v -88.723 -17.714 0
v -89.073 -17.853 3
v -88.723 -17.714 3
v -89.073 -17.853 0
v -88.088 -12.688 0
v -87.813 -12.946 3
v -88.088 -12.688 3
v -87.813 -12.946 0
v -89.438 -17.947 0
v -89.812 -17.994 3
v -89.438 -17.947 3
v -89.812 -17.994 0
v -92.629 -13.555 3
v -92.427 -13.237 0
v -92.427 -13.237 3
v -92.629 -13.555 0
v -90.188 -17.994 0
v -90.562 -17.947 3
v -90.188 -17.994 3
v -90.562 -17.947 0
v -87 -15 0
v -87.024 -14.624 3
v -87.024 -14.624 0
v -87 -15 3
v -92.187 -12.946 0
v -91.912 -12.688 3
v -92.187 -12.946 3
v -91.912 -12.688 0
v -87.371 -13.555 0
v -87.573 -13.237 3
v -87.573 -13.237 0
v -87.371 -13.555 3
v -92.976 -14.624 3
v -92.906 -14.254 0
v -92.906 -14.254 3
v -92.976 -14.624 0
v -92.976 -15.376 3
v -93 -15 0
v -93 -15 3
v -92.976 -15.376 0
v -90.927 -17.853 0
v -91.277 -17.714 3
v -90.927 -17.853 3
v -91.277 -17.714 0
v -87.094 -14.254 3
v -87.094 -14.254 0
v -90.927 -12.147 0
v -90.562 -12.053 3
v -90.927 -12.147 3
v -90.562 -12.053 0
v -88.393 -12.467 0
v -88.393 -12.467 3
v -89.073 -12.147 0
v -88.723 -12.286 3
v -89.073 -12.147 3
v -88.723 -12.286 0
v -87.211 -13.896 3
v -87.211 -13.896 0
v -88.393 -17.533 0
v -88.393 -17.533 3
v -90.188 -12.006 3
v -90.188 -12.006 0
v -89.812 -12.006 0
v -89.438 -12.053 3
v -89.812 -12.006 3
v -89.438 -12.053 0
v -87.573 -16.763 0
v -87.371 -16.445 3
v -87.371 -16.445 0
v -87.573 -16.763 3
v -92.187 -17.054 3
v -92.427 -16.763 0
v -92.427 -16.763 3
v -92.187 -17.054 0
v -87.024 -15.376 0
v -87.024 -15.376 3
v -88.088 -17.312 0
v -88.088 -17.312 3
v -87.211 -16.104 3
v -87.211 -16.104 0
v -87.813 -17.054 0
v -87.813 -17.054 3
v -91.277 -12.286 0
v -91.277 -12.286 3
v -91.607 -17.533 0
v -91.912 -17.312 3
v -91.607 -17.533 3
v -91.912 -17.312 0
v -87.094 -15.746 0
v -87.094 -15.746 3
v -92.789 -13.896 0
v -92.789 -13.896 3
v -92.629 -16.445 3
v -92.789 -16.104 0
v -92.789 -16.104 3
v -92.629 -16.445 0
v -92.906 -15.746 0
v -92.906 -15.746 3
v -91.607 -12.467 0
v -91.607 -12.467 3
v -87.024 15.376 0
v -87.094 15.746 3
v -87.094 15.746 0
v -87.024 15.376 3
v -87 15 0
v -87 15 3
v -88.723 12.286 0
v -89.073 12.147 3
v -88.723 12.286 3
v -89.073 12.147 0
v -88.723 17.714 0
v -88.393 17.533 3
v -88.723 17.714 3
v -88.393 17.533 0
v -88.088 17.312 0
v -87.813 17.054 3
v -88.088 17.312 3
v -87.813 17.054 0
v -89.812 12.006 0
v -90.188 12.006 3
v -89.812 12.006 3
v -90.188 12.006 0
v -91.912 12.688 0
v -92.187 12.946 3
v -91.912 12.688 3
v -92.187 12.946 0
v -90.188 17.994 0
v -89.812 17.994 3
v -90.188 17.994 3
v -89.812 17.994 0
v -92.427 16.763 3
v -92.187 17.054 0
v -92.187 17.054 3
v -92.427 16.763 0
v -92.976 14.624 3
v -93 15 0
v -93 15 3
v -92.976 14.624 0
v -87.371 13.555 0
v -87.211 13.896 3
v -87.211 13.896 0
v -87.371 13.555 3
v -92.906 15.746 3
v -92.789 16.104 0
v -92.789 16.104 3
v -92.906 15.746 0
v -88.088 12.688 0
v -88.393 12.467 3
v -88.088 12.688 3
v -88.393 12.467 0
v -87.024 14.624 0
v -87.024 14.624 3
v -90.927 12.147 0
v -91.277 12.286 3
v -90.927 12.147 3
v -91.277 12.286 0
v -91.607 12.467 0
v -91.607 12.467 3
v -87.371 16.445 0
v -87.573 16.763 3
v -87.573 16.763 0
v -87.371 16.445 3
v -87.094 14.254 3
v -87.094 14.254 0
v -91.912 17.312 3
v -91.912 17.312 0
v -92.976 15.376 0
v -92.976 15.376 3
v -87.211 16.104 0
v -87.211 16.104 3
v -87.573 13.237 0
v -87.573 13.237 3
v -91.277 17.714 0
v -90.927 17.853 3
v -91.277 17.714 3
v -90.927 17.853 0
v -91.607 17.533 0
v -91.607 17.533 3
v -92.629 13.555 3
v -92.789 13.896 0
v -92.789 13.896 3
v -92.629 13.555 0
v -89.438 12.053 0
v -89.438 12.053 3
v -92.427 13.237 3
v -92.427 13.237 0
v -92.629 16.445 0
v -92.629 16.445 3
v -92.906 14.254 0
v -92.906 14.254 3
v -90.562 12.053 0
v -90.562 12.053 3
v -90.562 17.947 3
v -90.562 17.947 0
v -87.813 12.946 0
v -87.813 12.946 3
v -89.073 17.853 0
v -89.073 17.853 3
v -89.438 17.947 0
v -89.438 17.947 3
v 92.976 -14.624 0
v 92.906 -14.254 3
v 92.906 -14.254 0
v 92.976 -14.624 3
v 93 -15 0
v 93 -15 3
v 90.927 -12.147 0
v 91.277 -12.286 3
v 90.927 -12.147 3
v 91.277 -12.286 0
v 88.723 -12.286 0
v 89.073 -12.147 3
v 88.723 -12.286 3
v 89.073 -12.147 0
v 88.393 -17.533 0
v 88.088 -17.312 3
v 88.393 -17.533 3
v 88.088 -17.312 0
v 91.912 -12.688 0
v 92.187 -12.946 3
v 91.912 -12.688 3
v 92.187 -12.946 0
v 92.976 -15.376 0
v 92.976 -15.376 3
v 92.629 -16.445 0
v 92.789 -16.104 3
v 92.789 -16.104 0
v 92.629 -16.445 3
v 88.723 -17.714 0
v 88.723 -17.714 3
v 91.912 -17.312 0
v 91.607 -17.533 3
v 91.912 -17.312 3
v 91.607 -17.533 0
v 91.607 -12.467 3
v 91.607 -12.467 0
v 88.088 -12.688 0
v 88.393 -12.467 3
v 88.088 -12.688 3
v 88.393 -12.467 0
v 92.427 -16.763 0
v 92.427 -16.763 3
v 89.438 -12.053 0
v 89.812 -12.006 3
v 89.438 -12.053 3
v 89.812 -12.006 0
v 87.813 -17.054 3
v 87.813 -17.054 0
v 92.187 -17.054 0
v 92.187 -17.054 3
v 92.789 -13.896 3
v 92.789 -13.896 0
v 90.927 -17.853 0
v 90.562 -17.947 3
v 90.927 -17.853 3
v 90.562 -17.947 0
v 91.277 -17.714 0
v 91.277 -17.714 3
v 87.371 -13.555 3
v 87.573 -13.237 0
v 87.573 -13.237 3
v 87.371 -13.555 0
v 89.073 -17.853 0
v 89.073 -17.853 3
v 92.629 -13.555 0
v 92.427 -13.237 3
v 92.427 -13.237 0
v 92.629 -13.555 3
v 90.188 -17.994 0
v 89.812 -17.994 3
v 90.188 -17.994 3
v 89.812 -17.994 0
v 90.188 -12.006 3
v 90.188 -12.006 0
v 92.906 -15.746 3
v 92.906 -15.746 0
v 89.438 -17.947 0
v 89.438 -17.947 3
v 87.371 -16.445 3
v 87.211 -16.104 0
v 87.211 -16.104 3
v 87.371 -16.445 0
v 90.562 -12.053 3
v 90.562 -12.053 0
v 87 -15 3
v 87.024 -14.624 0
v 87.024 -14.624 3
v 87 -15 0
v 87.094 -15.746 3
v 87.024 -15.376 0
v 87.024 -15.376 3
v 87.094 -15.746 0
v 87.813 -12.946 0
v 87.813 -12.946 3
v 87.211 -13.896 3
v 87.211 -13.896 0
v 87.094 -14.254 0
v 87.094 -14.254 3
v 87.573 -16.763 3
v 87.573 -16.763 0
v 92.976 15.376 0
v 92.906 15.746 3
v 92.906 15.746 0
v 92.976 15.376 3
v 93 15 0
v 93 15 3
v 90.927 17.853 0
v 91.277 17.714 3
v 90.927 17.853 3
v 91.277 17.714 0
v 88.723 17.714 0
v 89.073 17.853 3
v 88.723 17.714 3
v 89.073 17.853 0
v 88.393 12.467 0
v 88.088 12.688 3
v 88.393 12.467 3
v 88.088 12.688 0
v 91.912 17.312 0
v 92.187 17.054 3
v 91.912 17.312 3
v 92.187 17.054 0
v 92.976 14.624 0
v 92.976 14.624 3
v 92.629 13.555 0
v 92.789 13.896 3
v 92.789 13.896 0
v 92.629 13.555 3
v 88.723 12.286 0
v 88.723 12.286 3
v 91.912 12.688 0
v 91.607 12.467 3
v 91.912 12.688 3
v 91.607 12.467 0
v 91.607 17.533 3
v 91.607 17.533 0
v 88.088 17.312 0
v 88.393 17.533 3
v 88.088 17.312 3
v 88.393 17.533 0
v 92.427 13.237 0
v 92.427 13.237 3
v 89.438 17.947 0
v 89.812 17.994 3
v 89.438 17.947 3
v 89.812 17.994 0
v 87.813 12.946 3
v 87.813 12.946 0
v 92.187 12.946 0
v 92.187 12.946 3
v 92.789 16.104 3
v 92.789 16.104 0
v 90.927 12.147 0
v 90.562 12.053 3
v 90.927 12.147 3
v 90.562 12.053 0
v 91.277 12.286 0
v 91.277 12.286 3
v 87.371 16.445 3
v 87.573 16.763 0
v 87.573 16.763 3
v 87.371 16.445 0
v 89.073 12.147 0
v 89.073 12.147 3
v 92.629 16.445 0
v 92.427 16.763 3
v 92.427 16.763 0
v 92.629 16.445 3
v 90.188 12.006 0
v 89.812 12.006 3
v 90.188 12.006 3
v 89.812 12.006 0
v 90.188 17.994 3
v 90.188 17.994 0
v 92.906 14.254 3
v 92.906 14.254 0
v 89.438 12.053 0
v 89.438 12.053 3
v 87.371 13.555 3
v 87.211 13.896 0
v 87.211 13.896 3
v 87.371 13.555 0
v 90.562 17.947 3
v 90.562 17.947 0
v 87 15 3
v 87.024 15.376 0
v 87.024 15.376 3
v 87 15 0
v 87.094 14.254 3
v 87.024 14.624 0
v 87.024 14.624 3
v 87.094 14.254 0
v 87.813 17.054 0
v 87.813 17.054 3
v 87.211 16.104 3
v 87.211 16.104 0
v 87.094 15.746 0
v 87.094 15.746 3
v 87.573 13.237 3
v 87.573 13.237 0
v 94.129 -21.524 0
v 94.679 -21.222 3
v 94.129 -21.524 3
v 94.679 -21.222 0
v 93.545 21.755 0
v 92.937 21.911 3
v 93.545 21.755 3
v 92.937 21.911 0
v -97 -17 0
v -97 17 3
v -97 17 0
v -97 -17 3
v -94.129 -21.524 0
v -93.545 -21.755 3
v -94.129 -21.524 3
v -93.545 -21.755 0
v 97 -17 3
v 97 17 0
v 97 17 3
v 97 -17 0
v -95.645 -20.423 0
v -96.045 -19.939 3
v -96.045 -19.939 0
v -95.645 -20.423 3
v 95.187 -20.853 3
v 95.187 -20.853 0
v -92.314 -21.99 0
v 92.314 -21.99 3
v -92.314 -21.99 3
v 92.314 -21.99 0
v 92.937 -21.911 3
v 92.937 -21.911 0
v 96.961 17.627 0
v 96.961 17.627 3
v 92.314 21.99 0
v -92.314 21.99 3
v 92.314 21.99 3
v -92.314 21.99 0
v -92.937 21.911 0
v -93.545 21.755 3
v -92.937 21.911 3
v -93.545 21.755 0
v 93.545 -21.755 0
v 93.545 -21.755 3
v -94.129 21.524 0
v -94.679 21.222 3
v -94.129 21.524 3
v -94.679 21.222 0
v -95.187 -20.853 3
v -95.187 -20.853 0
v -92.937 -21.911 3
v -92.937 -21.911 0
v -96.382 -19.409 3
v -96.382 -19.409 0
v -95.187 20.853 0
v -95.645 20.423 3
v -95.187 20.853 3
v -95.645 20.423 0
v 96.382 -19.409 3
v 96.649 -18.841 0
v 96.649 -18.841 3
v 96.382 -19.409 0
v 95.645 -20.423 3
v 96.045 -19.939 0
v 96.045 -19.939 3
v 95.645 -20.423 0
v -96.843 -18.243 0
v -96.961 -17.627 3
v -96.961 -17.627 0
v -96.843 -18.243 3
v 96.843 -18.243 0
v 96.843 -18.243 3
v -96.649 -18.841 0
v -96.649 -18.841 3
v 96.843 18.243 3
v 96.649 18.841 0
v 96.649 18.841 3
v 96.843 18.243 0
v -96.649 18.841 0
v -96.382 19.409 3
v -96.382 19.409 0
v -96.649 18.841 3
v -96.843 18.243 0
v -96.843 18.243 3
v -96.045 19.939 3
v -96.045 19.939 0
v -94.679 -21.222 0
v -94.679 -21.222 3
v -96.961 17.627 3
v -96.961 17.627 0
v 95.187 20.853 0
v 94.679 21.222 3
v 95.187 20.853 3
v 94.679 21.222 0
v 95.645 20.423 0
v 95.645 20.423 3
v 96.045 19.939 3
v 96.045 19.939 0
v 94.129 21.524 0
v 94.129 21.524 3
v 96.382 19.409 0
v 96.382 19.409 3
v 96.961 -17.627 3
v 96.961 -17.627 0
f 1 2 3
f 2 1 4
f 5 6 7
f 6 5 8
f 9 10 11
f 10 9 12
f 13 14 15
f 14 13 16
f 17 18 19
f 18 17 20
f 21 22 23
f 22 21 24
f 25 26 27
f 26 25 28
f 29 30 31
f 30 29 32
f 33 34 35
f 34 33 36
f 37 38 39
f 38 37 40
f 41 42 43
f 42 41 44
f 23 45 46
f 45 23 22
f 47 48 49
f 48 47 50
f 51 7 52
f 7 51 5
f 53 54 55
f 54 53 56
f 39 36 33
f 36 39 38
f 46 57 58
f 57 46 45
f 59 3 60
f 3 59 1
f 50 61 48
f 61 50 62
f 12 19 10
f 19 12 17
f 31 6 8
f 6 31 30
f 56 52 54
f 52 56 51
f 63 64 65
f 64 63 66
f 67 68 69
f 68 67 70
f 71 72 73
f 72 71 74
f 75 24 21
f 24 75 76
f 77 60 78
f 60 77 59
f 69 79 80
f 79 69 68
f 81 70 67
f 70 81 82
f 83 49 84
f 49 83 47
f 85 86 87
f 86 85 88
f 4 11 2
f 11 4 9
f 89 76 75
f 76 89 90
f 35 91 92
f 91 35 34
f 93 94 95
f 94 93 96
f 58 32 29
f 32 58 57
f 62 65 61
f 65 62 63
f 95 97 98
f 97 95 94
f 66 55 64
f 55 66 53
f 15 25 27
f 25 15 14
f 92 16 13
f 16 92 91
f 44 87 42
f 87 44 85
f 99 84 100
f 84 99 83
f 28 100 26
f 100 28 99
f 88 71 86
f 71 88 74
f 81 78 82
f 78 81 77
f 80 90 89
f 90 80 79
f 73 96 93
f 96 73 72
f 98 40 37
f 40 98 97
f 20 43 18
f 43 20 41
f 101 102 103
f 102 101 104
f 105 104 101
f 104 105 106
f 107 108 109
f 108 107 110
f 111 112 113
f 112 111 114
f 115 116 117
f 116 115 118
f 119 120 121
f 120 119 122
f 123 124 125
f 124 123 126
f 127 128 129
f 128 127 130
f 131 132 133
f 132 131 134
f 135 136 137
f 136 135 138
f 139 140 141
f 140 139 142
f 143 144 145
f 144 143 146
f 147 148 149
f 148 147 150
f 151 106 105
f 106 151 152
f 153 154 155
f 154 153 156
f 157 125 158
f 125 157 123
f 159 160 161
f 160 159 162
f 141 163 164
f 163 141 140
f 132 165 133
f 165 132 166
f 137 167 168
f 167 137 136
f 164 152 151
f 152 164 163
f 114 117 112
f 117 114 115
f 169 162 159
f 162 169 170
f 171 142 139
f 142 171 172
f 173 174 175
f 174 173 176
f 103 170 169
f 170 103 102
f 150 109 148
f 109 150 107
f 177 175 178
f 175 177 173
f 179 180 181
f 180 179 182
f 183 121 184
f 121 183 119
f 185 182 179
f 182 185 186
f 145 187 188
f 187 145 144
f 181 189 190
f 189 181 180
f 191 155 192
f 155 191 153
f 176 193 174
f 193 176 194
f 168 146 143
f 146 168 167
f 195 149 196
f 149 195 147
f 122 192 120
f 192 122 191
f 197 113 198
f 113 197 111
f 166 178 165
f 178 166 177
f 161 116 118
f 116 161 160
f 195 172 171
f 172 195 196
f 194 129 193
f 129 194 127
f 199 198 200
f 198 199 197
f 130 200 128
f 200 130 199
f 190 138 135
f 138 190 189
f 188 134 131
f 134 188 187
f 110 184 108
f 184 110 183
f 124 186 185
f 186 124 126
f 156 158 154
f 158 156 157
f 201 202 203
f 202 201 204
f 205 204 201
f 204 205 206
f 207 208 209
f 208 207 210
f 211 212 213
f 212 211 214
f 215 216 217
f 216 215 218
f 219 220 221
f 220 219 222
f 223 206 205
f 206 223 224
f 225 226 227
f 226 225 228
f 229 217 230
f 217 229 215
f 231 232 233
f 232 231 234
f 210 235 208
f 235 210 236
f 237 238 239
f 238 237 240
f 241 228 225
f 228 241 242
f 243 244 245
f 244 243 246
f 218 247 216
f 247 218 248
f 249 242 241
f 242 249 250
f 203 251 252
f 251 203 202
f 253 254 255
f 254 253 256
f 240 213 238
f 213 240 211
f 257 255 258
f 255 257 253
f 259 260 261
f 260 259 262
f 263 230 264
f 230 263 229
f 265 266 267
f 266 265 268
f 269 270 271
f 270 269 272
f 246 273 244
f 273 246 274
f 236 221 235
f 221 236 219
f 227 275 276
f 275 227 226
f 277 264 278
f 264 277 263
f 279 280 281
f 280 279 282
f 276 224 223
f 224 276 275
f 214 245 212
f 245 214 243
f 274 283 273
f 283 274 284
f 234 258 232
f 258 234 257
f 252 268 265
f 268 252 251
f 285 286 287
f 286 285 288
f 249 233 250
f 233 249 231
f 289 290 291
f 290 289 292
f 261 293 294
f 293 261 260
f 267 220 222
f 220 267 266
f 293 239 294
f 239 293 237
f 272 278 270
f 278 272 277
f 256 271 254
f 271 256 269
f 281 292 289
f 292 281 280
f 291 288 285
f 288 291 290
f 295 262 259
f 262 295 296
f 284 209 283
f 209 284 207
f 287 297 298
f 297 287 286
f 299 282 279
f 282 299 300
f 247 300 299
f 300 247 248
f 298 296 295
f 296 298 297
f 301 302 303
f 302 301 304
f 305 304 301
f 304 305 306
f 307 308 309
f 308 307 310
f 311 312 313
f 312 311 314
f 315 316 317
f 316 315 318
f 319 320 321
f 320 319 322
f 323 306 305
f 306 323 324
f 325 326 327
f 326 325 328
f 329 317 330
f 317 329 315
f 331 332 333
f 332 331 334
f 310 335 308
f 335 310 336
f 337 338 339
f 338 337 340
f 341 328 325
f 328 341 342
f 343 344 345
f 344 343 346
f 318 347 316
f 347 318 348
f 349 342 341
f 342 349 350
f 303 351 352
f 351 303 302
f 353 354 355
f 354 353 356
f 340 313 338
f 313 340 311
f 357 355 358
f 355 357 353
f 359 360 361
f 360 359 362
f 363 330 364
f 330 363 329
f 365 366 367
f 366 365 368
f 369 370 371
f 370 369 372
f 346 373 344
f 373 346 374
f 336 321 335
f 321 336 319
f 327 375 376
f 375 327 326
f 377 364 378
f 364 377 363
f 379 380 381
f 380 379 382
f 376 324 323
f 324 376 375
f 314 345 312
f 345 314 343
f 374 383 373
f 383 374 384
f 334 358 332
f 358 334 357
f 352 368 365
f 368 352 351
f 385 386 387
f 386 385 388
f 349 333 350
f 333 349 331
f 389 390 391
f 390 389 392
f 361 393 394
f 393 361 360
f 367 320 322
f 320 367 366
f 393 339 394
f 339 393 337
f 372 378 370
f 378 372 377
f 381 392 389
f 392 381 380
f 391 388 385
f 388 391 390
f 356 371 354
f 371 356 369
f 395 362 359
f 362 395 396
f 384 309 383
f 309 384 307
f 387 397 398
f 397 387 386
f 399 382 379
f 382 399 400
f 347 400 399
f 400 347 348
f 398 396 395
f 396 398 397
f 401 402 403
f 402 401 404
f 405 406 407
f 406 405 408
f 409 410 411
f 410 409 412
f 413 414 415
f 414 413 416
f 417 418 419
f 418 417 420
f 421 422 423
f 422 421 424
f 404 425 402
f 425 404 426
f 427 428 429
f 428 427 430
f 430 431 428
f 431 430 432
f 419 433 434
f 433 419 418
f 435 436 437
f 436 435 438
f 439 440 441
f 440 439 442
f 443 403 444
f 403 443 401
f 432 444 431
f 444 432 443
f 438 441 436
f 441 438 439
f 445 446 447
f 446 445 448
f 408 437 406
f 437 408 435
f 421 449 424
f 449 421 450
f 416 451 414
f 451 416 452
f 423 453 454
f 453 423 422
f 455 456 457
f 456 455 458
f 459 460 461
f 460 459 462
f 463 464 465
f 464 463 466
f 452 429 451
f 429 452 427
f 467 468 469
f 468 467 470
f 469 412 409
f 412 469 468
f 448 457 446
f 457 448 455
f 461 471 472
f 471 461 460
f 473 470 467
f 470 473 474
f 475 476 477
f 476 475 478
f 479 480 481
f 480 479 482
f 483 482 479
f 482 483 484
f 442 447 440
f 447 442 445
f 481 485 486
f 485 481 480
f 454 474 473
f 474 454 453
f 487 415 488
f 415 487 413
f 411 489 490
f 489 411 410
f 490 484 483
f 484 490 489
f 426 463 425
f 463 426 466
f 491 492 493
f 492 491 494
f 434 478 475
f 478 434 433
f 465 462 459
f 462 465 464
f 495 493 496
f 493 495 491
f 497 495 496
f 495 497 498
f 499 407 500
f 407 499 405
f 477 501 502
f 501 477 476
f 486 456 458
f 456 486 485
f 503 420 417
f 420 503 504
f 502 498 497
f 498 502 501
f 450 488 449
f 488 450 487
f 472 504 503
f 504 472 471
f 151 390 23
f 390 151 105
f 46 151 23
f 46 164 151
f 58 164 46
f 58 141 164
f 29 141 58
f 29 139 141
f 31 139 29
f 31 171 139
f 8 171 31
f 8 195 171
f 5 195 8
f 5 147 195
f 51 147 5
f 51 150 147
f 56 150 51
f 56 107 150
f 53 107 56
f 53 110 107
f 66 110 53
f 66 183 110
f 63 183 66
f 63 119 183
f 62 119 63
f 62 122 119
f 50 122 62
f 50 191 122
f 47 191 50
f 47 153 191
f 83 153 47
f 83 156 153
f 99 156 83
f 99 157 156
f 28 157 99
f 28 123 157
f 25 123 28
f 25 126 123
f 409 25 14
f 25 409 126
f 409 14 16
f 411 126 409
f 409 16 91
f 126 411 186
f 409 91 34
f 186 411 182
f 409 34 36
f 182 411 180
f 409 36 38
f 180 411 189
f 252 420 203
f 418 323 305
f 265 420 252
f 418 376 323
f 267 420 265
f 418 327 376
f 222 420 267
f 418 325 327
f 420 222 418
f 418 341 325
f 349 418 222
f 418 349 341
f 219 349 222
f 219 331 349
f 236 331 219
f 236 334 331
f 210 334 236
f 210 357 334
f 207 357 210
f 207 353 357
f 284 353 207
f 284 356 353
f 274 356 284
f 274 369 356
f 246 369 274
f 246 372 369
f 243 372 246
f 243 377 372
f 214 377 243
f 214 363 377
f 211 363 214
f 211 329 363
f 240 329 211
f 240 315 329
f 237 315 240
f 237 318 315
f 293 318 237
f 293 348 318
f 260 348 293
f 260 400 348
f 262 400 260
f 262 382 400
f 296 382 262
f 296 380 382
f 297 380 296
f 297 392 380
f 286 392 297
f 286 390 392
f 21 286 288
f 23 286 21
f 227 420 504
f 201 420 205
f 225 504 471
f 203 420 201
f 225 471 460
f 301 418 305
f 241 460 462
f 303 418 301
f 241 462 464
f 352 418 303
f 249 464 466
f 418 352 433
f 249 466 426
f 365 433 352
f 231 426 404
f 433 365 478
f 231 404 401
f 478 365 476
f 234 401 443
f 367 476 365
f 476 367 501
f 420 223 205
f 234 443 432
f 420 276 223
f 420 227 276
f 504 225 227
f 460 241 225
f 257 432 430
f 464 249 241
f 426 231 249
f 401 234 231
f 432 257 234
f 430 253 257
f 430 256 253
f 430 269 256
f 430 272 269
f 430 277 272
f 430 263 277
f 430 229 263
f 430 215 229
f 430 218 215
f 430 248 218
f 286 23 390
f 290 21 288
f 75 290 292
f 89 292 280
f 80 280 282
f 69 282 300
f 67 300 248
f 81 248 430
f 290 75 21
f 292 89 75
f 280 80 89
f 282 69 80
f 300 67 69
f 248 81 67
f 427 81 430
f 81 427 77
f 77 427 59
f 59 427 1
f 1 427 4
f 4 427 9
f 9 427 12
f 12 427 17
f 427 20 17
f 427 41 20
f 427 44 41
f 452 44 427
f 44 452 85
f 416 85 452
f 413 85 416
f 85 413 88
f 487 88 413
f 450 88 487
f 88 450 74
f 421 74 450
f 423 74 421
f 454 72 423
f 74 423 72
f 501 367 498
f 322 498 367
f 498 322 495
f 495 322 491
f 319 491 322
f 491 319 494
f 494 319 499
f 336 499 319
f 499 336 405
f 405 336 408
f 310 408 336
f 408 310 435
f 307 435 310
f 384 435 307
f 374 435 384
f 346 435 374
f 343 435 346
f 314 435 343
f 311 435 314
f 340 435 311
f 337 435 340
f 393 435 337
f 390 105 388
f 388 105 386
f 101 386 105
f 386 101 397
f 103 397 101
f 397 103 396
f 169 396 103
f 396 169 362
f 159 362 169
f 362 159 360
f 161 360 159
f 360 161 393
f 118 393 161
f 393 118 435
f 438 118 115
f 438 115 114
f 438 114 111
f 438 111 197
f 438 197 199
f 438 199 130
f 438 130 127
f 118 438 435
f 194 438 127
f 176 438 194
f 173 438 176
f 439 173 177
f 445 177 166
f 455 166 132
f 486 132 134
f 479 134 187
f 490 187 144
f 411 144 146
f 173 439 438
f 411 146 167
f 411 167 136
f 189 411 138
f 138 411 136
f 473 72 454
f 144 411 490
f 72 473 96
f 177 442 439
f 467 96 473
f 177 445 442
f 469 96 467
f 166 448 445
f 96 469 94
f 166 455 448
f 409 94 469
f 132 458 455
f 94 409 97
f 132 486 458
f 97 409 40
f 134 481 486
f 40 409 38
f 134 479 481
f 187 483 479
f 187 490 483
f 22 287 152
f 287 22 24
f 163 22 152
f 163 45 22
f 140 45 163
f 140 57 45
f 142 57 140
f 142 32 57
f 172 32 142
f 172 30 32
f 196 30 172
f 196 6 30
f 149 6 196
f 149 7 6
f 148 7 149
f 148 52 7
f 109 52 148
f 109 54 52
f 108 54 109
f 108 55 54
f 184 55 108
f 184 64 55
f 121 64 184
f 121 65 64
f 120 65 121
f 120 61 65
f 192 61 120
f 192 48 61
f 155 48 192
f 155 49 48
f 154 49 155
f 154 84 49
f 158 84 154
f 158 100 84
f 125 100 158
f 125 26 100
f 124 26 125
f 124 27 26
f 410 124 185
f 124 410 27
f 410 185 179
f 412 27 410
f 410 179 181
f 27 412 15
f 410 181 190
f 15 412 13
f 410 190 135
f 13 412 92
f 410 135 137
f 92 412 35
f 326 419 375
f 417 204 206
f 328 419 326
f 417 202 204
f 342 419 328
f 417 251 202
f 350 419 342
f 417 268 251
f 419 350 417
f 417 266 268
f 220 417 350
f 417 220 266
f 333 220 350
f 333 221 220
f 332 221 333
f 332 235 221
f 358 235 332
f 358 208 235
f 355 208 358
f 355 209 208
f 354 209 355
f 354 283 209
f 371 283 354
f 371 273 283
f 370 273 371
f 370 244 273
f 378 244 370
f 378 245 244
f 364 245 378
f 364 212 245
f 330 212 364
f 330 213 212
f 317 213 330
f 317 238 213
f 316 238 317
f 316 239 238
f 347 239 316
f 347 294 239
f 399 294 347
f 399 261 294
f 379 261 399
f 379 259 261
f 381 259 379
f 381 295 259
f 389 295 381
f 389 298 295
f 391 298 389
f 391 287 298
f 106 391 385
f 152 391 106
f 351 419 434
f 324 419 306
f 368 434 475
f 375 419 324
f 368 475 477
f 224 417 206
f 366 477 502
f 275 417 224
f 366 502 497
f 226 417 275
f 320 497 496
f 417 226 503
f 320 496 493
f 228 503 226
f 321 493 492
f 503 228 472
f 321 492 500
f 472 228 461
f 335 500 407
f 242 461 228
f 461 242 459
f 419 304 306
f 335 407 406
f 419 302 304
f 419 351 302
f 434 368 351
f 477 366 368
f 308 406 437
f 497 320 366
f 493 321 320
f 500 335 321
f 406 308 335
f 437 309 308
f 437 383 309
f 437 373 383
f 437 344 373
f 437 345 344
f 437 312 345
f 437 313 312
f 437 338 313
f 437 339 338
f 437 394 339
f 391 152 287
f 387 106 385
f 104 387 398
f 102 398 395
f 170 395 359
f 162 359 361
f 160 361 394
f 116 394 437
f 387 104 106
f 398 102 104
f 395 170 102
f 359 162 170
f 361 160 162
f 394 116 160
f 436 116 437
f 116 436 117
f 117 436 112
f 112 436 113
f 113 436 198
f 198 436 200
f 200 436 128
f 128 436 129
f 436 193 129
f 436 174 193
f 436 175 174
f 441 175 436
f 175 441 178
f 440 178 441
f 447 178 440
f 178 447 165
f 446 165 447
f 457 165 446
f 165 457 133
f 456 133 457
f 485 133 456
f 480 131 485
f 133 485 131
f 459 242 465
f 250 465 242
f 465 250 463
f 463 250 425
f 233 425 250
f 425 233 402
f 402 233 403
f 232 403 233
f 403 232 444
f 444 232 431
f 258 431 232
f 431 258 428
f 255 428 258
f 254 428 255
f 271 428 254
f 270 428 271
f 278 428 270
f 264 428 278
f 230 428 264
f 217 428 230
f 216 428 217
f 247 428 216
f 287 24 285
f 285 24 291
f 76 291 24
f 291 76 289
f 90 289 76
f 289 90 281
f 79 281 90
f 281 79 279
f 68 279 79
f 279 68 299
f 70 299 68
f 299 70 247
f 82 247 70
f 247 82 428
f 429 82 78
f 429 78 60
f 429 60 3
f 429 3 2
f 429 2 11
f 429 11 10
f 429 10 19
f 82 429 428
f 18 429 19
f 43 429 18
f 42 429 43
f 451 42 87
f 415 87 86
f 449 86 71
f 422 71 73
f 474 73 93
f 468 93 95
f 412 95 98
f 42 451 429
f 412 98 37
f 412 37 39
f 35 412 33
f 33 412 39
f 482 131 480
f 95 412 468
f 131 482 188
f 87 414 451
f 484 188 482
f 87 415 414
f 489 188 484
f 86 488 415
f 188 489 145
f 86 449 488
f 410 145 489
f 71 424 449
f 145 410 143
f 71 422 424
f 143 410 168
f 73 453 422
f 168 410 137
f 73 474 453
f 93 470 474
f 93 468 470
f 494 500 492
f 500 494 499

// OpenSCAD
$fn = 50;


difference() {
	union() {
		hull() {
			translate(v = [-92.0000000000, 17.0000000000, 0]) {
				cylinder(h = 3, r = 5);
			}
			translate(v = [92.0000000000, 17.0000000000, 0]) {
				cylinder(h = 3, r = 5);
			}
			translate(v = [-92.0000000000, -17.0000000000, 0]) {
				cylinder(h = 3, r = 5);
			}
			translate(v = [92.0000000000, -17.0000000000, 0]) {
				cylinder(h = 3, r = 5);
			}
		}
	}
	union() {
		translate(v = [-90.0000000000, -15.0000000000, -100.0000000000]) {
			cylinder(h = 200, r = 3.0000000000);
		}
		translate(v = [-90.0000000000, 15.0000000000, -100.0000000000]) {
			cylinder(h = 200, r = 3.0000000000);
		}
		translate(v = [90.0000000000, -15.0000000000, -100.0000000000]) {
			cylinder(h = 200, r = 3.0000000000);
		}
		translate(v = [90.0000000000, 15.0000000000, -100.0000000000]) {
			cylinder(h = 200, r = 3.0000000000);
		}
	}
}
